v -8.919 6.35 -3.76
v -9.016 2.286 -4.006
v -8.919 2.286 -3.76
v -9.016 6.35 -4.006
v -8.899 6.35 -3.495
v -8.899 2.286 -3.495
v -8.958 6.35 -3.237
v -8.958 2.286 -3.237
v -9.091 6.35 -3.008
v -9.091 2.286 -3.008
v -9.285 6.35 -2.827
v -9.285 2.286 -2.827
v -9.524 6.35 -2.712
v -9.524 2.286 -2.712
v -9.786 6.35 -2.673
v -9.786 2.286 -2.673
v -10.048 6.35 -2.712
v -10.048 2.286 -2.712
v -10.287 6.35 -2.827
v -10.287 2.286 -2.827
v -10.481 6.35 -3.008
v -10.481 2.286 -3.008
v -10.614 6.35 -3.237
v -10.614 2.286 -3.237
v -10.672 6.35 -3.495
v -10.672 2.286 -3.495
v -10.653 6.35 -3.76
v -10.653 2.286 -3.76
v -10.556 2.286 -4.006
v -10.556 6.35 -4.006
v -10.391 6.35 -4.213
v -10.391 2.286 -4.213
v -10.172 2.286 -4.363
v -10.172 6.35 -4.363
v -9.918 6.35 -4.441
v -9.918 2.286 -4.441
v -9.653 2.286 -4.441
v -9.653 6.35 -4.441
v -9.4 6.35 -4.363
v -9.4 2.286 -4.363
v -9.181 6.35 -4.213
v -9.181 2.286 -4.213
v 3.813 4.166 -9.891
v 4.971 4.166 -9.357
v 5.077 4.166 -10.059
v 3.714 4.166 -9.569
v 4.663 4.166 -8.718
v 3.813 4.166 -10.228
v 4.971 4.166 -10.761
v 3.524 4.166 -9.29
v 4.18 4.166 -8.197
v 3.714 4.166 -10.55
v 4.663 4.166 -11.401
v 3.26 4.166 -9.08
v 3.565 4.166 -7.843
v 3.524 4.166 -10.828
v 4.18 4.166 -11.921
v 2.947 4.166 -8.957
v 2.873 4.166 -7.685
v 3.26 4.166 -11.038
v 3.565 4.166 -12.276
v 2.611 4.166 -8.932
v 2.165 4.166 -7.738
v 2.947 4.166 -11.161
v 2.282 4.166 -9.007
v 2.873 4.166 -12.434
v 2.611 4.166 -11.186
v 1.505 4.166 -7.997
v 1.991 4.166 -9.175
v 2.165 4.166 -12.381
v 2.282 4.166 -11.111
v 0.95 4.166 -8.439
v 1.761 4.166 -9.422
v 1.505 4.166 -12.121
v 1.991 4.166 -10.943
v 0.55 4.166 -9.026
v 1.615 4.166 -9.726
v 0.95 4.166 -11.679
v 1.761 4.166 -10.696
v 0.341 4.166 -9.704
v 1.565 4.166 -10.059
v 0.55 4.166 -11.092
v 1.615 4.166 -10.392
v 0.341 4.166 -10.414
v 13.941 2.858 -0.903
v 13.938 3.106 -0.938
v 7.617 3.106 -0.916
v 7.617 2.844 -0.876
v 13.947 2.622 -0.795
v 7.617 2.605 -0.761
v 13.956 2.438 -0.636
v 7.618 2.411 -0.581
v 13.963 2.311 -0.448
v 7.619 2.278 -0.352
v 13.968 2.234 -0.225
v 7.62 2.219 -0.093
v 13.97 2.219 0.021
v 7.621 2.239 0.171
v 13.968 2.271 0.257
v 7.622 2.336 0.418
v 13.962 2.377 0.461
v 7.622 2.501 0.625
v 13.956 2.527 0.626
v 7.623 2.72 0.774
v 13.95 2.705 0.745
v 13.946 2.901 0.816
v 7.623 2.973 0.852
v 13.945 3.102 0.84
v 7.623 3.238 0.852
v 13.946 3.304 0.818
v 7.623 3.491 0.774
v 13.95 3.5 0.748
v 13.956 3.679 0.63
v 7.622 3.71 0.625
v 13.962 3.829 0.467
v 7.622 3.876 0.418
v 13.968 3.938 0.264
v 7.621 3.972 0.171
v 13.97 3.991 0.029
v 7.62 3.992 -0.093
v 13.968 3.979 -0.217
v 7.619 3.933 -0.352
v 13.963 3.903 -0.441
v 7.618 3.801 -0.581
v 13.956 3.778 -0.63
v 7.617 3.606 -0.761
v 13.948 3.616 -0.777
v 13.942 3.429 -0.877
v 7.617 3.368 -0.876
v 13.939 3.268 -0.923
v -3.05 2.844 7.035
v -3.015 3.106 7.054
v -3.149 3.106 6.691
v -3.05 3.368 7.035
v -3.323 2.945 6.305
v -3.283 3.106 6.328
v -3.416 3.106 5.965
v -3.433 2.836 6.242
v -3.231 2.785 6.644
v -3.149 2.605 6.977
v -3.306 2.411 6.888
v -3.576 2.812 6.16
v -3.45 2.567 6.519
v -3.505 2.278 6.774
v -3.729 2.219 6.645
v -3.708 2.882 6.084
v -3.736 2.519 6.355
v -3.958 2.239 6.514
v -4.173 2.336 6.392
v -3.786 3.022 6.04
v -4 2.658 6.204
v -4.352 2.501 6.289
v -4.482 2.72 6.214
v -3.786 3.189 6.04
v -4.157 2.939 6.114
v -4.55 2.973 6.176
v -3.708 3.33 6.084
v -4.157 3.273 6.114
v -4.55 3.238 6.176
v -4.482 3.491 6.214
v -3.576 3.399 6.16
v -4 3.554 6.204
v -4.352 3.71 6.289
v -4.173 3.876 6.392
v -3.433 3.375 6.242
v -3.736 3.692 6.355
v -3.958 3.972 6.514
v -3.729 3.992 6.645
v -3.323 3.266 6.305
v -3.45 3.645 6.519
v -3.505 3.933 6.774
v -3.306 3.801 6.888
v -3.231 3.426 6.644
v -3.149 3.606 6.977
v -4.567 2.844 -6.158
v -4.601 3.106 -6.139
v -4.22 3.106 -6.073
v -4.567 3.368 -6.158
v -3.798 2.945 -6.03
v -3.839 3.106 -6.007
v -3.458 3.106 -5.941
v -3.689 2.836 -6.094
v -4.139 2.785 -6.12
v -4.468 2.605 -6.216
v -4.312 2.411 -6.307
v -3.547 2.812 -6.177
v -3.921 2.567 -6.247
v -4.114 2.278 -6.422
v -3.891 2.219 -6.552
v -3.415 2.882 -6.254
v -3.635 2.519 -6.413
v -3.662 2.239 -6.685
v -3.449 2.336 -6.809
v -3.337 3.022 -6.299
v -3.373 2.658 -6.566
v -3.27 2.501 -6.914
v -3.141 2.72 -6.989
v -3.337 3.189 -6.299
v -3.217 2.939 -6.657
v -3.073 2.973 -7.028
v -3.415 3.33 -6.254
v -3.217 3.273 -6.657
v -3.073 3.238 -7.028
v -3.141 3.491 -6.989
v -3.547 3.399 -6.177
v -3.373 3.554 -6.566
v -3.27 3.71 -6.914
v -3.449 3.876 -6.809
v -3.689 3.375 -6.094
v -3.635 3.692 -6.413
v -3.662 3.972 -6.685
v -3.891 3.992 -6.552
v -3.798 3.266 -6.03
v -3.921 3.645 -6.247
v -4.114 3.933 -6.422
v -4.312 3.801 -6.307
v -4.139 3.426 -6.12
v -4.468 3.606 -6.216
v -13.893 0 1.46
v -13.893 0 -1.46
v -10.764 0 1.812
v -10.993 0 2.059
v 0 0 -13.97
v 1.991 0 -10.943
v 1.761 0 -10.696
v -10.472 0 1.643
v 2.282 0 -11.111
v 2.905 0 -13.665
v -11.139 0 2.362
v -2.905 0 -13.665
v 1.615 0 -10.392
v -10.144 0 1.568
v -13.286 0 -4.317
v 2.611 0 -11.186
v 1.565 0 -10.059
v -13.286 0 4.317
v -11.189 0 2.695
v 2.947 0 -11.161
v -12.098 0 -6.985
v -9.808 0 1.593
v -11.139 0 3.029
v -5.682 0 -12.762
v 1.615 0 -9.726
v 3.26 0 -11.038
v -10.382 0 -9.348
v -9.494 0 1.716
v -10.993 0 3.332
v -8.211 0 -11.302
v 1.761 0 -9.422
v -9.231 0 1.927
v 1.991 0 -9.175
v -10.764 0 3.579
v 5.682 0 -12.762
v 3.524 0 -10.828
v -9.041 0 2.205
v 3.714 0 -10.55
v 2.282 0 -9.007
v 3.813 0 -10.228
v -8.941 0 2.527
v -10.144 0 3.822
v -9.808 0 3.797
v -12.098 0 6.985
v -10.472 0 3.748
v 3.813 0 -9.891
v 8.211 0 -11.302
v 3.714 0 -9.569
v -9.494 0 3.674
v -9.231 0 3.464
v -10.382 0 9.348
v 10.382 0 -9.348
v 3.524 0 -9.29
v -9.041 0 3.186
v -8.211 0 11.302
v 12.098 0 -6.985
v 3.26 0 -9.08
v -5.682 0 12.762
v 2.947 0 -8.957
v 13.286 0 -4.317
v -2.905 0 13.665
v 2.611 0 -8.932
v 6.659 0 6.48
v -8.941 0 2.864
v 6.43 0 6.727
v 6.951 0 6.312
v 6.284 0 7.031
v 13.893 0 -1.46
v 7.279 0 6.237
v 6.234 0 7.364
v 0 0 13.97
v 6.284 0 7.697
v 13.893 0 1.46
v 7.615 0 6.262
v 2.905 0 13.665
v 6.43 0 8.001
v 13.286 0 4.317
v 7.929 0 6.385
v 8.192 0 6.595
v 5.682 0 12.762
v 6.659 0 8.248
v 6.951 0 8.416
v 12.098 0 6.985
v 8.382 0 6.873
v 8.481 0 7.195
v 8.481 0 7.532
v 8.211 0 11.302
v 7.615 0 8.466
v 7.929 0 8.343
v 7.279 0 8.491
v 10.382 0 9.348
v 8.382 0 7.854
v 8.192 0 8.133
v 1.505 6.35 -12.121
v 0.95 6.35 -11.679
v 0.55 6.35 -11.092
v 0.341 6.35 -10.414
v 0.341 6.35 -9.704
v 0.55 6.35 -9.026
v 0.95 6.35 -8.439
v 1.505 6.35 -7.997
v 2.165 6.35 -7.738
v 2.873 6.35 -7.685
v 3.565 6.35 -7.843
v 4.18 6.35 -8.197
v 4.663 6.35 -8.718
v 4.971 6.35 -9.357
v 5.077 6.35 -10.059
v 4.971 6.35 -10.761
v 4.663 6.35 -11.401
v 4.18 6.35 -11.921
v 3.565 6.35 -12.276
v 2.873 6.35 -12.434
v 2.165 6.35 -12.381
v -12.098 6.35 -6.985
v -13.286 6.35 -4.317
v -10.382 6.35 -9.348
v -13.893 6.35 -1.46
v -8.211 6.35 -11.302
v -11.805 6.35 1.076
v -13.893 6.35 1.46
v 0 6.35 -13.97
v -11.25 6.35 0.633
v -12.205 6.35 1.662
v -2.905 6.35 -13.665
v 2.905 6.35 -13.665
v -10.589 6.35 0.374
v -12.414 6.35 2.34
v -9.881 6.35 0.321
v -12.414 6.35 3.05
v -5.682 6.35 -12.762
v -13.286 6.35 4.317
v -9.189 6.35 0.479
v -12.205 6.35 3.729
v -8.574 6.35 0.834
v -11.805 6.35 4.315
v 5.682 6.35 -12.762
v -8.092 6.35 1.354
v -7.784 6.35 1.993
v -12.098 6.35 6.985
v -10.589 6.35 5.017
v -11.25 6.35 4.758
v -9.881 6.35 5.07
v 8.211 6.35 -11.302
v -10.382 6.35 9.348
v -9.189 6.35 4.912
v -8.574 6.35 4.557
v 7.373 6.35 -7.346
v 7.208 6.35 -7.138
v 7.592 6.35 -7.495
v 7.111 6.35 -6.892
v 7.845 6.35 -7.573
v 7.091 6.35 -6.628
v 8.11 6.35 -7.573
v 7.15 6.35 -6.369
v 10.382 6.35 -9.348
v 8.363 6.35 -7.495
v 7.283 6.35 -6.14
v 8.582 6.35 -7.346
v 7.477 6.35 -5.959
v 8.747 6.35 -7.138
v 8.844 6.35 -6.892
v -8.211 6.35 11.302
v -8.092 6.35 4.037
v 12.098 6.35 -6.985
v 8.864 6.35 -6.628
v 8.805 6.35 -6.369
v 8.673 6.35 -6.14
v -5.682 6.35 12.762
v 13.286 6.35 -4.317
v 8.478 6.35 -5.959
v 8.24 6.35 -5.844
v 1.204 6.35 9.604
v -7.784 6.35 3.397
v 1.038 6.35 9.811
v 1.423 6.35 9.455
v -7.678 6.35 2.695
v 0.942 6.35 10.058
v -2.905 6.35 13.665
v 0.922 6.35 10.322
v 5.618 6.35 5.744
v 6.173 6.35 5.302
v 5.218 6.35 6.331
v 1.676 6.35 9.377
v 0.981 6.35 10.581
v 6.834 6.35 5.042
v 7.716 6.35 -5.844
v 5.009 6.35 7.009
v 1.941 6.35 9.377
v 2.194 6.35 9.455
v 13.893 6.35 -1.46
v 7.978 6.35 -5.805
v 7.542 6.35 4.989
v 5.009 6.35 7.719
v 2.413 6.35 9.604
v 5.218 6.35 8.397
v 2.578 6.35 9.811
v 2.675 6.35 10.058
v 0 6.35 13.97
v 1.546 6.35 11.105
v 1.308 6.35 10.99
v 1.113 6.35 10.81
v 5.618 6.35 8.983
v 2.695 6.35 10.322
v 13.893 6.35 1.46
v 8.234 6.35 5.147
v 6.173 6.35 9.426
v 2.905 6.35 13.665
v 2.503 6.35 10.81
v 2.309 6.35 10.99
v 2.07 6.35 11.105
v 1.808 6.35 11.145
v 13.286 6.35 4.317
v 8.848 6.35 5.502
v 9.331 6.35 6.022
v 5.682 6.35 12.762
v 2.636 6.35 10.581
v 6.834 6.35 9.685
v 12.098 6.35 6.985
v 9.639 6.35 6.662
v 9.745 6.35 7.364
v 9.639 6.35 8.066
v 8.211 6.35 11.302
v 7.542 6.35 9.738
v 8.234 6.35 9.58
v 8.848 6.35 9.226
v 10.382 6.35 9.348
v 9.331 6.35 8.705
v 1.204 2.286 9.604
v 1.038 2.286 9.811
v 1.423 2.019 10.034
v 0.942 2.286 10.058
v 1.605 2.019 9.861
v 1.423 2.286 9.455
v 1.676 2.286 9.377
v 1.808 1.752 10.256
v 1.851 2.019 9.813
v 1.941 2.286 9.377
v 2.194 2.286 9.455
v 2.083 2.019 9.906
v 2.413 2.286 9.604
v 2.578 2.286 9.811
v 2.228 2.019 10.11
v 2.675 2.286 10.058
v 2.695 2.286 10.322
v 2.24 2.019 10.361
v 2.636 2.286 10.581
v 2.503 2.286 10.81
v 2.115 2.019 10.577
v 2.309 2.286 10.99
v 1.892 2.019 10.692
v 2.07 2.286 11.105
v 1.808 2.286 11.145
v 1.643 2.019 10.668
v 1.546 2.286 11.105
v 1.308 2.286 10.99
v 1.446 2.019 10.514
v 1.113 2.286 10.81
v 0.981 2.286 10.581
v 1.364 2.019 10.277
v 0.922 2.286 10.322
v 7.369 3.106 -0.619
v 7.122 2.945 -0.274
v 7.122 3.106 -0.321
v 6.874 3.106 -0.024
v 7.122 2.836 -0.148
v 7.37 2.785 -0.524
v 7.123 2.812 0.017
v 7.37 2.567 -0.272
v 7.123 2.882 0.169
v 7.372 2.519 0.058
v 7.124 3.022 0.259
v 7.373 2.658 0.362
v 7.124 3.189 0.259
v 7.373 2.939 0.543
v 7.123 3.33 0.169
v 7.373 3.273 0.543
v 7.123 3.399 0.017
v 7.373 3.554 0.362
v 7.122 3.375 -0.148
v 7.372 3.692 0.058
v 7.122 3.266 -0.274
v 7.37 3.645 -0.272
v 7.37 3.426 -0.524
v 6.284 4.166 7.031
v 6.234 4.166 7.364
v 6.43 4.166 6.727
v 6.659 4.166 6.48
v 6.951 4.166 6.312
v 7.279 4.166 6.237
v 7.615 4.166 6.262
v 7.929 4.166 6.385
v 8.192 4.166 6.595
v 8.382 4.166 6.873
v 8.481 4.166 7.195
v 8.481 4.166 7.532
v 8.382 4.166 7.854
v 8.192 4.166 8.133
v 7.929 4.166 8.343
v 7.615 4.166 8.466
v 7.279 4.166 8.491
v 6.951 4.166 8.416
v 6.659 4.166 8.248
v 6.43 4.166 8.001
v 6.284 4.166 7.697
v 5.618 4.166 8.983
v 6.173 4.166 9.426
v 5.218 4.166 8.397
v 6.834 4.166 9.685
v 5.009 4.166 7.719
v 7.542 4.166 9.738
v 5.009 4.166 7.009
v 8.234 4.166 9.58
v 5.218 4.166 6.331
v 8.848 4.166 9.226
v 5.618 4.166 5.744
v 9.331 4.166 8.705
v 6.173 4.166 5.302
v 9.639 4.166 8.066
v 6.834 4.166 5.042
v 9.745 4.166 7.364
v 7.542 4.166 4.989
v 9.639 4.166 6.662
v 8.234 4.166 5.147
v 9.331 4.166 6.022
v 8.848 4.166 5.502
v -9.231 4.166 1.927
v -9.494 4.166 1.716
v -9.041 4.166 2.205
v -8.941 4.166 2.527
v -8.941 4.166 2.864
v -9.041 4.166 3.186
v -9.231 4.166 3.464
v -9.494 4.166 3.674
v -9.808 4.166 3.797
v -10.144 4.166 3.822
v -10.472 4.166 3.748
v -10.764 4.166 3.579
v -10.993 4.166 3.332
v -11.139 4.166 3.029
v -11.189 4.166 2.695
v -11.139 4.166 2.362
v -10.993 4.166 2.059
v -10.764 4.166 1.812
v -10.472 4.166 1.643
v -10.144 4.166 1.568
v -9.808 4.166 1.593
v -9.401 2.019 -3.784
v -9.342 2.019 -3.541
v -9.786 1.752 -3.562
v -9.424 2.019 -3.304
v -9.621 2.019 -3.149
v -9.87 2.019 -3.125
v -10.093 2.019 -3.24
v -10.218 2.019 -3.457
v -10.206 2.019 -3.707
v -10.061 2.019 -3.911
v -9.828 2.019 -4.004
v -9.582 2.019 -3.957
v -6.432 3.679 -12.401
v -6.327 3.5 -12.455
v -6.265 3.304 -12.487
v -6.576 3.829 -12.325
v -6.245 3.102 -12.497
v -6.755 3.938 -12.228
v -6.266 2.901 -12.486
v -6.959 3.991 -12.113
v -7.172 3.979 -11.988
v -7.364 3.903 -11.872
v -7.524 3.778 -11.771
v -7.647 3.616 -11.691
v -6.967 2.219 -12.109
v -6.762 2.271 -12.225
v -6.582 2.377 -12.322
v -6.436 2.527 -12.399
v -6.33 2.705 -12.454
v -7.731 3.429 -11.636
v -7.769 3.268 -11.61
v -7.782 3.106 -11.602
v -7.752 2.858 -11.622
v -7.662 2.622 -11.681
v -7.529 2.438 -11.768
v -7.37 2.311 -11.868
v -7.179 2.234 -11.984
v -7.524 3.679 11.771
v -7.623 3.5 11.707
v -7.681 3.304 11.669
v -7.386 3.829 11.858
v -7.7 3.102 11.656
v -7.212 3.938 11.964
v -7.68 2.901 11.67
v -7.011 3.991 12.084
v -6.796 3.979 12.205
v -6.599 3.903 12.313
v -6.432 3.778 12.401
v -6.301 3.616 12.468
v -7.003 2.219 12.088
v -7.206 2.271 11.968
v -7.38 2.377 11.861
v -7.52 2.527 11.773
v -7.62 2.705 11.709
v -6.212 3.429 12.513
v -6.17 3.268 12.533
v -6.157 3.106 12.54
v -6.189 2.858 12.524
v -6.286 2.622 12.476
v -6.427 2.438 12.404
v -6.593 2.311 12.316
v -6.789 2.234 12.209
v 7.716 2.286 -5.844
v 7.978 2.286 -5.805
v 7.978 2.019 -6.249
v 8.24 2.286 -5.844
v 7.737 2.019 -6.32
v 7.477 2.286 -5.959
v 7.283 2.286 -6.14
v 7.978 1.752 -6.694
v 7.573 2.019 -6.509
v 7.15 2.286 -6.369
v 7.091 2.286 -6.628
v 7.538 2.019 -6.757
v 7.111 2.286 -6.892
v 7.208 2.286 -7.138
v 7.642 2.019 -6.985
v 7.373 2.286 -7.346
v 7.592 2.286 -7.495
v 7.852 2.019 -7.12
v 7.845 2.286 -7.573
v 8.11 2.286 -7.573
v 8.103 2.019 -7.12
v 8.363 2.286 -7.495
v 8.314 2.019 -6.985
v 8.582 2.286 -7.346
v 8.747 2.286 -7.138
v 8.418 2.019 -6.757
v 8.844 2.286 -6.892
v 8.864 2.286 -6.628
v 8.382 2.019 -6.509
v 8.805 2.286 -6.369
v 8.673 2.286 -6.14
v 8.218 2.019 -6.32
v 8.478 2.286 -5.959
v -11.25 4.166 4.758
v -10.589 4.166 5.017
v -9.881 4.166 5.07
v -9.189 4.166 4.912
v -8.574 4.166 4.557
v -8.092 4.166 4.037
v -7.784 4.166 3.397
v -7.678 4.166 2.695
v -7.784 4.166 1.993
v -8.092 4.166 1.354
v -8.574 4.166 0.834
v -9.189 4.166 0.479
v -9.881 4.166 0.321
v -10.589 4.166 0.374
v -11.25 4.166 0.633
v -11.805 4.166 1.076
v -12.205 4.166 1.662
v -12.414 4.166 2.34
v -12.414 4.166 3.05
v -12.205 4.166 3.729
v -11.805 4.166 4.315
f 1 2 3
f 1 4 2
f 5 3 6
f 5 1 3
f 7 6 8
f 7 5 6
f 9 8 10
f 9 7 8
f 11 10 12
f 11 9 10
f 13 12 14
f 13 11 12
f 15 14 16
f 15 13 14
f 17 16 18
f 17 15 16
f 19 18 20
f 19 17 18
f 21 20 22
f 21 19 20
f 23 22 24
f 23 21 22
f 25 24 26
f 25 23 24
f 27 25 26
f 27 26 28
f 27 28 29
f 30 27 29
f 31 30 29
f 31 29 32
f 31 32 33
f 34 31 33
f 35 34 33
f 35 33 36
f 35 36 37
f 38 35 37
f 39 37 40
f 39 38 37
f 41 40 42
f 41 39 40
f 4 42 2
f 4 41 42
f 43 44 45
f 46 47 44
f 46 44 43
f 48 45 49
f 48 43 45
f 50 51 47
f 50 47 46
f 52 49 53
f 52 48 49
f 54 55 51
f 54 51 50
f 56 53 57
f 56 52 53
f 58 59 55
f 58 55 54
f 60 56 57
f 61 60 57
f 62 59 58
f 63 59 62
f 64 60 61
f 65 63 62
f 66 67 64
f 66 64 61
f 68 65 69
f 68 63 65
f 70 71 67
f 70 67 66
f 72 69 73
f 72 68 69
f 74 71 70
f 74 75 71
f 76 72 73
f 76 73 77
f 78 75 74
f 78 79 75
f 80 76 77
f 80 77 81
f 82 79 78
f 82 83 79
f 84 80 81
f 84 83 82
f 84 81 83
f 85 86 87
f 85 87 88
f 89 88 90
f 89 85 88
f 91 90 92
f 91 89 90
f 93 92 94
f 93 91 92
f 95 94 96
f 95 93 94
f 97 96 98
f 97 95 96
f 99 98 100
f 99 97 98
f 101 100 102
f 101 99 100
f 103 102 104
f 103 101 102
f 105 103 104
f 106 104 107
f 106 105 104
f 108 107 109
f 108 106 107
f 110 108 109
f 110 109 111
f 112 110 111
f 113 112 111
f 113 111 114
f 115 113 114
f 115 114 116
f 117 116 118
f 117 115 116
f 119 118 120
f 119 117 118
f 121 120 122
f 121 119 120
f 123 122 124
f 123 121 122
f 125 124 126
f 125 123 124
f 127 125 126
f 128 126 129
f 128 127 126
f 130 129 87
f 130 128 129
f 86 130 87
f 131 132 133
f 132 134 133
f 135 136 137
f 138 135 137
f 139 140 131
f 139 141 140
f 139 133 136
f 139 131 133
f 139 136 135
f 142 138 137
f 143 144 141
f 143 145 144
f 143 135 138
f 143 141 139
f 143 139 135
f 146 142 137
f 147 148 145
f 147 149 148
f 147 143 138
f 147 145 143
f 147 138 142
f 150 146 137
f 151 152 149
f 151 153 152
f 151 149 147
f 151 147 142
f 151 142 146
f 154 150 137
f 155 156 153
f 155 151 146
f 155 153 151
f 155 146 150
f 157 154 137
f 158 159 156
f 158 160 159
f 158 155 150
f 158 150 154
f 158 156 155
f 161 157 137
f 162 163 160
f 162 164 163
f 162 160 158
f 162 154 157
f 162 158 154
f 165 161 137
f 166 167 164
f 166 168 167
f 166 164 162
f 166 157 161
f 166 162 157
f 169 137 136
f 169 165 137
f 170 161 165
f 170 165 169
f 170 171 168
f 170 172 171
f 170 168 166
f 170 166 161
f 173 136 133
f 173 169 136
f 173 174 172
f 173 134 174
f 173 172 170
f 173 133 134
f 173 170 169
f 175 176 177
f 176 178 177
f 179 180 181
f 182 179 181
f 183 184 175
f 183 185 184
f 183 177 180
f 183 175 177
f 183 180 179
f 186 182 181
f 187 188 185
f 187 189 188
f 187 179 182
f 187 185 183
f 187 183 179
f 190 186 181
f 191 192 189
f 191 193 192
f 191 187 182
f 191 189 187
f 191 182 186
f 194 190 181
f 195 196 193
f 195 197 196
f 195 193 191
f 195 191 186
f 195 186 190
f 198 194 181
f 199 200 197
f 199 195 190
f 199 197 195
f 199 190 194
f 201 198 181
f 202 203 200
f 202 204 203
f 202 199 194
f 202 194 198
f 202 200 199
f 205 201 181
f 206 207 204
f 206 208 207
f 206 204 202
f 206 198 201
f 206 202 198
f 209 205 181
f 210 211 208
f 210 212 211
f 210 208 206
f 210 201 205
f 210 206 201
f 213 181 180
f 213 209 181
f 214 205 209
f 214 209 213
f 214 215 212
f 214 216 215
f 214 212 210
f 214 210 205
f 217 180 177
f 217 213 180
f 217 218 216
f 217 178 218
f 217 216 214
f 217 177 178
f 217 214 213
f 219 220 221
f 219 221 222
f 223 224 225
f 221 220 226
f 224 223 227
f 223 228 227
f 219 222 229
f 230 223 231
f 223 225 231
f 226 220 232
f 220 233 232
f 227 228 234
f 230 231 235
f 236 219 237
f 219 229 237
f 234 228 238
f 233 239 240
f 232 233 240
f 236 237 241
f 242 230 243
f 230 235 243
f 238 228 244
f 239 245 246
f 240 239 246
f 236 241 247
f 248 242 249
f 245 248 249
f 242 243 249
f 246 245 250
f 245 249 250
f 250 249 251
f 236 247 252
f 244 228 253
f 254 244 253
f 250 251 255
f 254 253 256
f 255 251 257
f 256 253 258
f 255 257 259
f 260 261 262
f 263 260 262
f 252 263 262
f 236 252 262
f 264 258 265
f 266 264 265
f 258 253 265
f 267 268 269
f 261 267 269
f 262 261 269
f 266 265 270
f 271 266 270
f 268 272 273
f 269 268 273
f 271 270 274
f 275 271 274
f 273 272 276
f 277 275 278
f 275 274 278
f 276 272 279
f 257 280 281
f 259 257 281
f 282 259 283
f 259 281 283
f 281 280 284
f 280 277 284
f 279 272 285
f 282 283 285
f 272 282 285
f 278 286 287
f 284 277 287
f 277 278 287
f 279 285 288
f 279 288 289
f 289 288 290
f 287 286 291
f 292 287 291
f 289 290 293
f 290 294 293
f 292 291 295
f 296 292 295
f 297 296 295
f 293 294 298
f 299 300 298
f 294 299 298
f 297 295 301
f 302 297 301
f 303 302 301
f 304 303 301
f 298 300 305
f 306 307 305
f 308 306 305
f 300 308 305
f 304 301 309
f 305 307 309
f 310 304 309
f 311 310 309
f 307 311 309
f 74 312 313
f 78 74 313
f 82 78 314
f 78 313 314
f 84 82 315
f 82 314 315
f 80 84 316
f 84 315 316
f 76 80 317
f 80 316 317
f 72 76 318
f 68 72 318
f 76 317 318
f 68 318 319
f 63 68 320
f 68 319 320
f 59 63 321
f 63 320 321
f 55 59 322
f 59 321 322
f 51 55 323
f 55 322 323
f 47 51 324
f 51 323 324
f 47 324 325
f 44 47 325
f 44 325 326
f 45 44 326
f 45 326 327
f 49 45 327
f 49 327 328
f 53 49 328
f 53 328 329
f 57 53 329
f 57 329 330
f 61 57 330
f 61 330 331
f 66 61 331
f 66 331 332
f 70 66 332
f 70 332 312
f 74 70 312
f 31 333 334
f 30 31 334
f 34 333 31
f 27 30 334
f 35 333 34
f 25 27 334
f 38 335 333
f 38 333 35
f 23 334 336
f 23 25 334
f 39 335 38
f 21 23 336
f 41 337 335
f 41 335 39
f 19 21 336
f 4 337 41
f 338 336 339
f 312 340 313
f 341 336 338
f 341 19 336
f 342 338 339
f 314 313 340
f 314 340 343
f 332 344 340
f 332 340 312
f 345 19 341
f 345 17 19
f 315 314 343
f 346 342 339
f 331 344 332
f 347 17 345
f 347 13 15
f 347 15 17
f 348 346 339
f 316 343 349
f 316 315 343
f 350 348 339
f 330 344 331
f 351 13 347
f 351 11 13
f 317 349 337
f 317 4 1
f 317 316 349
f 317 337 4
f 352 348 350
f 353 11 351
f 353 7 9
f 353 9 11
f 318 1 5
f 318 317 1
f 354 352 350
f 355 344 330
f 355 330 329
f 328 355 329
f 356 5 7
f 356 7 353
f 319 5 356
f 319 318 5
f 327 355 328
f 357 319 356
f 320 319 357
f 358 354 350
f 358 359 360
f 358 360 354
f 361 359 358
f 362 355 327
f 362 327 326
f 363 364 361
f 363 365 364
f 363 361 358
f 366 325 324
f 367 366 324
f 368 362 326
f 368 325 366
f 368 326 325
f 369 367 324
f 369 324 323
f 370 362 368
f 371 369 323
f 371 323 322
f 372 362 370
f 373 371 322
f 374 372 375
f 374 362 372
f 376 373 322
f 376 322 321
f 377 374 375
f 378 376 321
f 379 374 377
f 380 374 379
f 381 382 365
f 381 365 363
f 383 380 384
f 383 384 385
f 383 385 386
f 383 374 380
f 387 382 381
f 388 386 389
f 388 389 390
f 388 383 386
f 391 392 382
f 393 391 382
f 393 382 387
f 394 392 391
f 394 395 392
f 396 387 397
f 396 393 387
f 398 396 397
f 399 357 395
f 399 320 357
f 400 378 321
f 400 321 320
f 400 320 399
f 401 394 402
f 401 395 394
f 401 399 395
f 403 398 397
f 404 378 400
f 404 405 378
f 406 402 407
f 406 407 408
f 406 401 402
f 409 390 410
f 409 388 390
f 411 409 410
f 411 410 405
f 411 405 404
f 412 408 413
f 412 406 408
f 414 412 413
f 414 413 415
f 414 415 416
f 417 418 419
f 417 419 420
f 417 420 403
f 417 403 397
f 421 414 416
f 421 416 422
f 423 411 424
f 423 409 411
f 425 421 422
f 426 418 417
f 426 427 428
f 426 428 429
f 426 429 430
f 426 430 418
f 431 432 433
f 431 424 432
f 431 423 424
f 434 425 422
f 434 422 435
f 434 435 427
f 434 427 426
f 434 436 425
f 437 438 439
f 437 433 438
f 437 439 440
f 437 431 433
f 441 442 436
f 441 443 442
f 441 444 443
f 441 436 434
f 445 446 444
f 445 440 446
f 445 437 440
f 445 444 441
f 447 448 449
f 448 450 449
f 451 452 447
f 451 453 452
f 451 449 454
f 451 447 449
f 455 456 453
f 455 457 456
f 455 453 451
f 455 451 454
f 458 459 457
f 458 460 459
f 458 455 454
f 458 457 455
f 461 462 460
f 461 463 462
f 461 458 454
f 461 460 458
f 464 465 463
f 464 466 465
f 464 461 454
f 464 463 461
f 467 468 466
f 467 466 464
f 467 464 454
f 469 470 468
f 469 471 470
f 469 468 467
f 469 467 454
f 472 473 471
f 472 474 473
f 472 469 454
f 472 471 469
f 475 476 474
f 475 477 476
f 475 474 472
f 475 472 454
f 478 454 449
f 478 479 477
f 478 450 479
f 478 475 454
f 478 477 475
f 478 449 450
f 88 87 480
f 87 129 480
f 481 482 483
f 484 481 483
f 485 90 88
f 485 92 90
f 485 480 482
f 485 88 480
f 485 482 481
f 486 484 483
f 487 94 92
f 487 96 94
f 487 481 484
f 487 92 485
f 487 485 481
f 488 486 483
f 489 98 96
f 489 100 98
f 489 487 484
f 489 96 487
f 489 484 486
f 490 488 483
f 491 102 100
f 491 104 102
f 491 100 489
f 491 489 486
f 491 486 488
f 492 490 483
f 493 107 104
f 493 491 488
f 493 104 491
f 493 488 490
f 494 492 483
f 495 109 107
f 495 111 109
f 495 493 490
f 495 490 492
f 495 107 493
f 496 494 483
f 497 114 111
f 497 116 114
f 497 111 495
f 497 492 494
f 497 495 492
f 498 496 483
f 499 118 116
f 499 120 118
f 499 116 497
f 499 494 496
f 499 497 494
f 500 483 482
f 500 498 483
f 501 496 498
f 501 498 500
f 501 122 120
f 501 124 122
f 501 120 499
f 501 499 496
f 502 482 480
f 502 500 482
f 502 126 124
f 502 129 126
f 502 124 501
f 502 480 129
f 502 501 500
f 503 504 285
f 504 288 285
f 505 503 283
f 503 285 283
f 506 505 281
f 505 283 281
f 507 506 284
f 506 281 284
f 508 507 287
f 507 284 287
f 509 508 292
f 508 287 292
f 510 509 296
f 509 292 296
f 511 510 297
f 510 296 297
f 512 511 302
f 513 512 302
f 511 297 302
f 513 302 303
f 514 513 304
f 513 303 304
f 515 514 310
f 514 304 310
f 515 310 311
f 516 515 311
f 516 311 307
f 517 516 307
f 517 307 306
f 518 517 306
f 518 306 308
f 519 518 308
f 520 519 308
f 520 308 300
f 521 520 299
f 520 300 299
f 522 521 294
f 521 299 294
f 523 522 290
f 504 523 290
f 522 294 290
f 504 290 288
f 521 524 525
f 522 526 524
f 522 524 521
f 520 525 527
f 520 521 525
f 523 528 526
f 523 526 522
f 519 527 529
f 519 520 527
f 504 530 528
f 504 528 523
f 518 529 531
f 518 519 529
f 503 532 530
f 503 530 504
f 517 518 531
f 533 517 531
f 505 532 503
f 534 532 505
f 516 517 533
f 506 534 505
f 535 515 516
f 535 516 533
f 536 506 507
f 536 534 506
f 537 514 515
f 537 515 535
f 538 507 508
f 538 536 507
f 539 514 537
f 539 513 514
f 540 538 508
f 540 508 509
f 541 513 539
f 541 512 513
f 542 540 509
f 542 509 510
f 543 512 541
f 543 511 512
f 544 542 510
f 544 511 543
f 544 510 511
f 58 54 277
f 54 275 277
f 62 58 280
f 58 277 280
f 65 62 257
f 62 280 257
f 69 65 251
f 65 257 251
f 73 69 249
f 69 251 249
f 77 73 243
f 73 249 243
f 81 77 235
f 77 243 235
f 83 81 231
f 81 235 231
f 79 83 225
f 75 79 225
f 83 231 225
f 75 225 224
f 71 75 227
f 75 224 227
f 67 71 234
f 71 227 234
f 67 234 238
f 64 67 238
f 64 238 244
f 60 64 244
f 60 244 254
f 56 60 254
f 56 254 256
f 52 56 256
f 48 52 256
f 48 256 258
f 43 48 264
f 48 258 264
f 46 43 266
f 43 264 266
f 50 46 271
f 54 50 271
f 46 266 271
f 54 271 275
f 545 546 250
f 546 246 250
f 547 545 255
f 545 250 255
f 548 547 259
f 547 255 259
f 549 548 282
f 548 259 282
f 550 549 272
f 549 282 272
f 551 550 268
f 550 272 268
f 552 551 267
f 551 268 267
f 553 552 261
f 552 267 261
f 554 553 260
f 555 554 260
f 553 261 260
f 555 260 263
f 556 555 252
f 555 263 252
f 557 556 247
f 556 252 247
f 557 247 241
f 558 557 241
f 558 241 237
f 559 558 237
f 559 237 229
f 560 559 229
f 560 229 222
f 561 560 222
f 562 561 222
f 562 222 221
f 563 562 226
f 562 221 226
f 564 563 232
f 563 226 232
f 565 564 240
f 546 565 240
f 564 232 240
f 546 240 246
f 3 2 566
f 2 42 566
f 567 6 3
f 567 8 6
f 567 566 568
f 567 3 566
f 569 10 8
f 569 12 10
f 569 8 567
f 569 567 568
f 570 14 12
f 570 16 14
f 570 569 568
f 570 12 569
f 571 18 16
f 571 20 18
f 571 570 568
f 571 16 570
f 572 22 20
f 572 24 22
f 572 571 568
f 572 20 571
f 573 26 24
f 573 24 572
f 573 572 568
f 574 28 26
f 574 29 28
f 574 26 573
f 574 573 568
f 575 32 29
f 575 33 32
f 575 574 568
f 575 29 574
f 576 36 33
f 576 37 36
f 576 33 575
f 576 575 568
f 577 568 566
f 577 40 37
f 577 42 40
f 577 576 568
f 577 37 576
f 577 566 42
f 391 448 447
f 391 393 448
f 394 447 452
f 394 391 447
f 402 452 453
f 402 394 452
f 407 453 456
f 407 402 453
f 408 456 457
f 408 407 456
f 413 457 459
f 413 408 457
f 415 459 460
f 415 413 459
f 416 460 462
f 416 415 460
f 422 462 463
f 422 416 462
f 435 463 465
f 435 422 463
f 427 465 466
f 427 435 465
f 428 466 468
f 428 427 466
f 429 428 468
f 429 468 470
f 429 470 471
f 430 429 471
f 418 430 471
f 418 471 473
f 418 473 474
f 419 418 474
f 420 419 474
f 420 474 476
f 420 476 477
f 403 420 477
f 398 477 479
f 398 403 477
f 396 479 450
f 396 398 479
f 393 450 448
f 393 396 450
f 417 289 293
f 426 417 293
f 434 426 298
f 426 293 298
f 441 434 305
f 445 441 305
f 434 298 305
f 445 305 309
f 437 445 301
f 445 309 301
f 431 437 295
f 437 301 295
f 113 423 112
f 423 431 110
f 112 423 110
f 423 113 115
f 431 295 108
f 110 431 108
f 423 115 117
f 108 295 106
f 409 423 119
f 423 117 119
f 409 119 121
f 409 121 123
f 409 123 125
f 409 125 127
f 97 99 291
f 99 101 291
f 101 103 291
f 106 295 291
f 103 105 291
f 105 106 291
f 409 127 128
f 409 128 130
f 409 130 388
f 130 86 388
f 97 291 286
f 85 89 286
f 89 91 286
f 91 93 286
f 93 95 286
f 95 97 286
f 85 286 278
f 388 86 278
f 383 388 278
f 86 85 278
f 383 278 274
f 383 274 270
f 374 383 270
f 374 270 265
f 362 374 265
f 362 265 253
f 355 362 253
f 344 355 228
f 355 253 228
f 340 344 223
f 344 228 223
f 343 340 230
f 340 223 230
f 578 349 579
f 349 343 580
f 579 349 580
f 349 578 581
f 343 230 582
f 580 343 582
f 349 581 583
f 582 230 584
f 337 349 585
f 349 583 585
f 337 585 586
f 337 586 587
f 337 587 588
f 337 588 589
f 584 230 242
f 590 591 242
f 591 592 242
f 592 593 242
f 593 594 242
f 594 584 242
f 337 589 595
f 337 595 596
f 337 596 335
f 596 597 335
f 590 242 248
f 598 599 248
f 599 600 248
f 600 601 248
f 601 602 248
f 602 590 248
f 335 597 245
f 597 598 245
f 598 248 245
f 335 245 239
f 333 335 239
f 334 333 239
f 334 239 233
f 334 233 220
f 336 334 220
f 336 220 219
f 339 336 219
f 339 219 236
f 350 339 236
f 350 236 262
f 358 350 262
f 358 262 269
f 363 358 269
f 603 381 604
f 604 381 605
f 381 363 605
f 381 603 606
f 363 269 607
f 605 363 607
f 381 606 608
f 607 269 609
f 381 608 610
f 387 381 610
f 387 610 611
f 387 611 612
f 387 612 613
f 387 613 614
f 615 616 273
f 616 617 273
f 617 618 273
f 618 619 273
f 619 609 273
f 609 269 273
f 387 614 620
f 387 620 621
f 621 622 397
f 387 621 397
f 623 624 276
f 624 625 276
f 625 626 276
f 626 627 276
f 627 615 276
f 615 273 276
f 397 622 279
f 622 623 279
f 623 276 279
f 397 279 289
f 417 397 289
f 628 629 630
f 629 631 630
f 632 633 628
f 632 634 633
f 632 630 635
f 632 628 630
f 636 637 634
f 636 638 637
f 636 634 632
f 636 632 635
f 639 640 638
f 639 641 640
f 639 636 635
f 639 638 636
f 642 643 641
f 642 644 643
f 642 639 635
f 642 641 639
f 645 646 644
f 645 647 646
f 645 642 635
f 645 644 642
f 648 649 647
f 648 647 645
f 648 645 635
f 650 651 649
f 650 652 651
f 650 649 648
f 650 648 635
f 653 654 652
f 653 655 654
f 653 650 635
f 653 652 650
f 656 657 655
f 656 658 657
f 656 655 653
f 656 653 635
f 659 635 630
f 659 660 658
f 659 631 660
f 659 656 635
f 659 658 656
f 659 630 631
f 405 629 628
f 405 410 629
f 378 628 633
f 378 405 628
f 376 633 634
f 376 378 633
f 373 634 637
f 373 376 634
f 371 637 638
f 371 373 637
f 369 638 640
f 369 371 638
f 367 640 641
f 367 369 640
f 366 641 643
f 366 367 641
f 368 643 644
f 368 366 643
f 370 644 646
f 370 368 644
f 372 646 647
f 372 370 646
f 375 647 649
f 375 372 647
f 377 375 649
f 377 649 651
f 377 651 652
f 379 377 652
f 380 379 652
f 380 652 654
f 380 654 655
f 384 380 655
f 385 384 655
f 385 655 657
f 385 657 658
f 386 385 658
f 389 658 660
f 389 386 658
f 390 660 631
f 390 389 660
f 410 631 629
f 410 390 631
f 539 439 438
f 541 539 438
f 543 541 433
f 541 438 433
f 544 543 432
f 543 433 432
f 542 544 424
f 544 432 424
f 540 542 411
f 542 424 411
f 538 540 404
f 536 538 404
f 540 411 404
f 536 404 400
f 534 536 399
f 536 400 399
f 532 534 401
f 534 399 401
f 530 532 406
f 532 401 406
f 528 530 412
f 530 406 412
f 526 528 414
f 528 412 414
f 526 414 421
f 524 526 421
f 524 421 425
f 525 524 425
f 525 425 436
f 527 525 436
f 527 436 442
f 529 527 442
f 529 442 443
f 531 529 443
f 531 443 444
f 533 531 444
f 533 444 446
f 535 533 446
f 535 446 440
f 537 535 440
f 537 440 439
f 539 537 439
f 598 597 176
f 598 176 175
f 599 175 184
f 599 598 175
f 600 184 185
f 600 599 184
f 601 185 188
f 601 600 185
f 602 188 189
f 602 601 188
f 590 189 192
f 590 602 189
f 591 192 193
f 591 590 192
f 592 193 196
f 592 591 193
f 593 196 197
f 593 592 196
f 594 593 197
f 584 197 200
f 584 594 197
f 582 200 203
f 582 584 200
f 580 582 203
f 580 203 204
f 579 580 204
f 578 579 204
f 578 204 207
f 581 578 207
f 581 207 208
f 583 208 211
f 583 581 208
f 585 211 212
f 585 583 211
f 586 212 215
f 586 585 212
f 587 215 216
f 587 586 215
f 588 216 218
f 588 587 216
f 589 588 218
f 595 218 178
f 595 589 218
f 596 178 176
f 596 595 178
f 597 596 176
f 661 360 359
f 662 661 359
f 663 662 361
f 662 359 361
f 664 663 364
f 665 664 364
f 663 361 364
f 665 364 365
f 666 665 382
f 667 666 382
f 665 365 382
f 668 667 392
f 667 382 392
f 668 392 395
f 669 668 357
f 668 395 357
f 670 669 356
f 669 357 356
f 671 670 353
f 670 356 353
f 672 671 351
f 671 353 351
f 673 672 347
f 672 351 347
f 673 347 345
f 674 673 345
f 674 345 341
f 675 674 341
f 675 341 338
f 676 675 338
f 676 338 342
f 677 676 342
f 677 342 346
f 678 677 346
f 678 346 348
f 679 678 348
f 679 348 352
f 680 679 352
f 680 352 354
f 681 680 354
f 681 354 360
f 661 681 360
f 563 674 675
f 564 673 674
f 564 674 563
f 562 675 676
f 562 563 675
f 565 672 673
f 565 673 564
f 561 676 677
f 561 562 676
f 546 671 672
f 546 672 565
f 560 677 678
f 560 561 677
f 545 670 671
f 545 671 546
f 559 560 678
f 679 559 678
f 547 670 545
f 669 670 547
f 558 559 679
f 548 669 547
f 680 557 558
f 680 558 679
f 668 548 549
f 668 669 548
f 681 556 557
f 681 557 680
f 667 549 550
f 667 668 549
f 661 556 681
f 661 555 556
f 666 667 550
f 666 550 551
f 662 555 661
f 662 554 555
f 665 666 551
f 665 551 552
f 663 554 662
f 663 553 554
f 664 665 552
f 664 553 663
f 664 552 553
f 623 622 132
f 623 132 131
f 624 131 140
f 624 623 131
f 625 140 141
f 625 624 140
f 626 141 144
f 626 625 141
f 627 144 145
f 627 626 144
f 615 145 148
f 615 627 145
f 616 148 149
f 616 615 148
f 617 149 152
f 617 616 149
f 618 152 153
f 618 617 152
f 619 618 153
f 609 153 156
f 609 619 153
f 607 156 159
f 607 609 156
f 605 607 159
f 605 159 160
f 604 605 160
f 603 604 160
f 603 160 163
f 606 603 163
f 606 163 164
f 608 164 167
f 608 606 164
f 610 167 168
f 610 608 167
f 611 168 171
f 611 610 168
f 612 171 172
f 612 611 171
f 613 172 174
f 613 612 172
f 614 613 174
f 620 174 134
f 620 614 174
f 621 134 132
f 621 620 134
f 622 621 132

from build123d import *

# Parameters (mm, degrees)
SKETCH1_R                                      = 13.97
BOSS_EXTRUDE1_DEPTH                            = 6.35
CBORE_FOR_2_SOCKET_HEAD_CAP_SCREW1_D           = 2.2606
CBORE_FOR_2_SOCKET_HEAD_CAP_SCREW1_CBORE_D     = 4.7625
CBORE_FOR_2_SOCKET_HEAD_CAP_SCREW1_CBORE_DEPTH = 2.1844
CIRPATTERN1_COUNT                              = 3
CIRPATTERN2_COUNT                              = 3
CIRPATTERN3_COUNT                              = 3


with BuildPart() as part:
    # Sketch1 → Boss-Extrude1 (new body)
    with BuildSketch(Plane(origin=(0, 0, 0), x_dir=(1, 0, 0), z_dir=(0, 1, 0))):
        with Locations(Location((0, 0, 0), (0, 0, 270))):
            Circle(SKETCH1_R)
    extrude(amount=BOSS_EXTRUDE1_DEPTH)

    # CBORE for #2 Socket Head Cap Screw1 (through all)
    with Locations(Plane(origin=(0, 6.35, 0), x_dir=(1, 0, 0), z_dir=(0, 1, 0))):
        with Locations((7.363810019, -7.363810019)):
            cbore_for_2_socket_head_cap_screw1 = CounterBoreHole(CBORE_FOR_2_SOCKET_HEAD_CAP_SCREW1_D / 2, CBORE_FOR_2_SOCKET_HEAD_CAP_SCREW1_CBORE_D / 2, CBORE_FOR_2_SOCKET_HEAD_CAP_SCREW1_CBORE_DEPTH)

    # CirPattern1: CBORE for #2 Socket Head Cap Screw1 ×3 about axis
    cirpattern1_axis = Axis((0, 0, 0), (0, 1, 0))
    for i in range(1, CIRPATTERN1_COUNT):
        add(cbore_for_2_socket_head_cap_screw1.rotate(cirpattern1_axis, i * 360 / CIRPATTERN1_COUNT), mode=Mode.SUBTRACT)

    # Sketch10 → Tap Drill for #2-56 Tap2 (revolve, cut)
    with BuildSketch(Plane(origin=(7.977586831, 6.35, -6.693990167), x_dir=(0, 0, 1), z_dir=(1, 0, 0))):
        Polygon((0, 0), (0, 4.59816509), (0.889, 4.064), (0.889, 0), align=None)
    tap_drill_for_2_56_tap2 = revolve(axis=Axis((7.977586831, 12.7, -6.693990167), (0, -1, 0)), mode=Mode.SUBTRACT)

    # CirPattern2: Tap Drill for #2-56 Tap2 ×3 about axis
    cirpattern2_axis = Axis((0, 0, 0), (0, 1, 0))
    for i in range(1, CIRPATTERN2_COUNT):
        add(tap_drill_for_2_56_tap2.rotate(cirpattern2_axis, i * 360 / CIRPATTERN2_COUNT), mode=Mode.SUBTRACT)

    # Sketch15 → Tap Drill for #2-56 Tap1 (revolve, cut)
    with BuildSketch(Plane(origin=(-6.942501454, 3.105629072, 12.122812114), x_dir=(0.8677746681735182, 0, 0.4969578707258195), z_dir=(0, 1, 0))):
        Polygon((0, 0), (0, 7.095959572), (0.889, 6.35), (0.889, 0), align=None)
    tap_drill_for_2_56_tap1 = revolve(axis=Axis((-10.098183933, 3.105629072, 17.633181257), (0.4969578707258195, 0, -0.8677746681735182)), mode=Mode.SUBTRACT)

    # CirPattern3: Tap Drill for #2-56 Tap1 ×3 about axis
    cirpattern3_axis = Axis((0, 6.35, 0), (0, -1, 0))
    for i in range(1, CIRPATTERN3_COUNT):
        add(tap_drill_for_2_56_tap1.rotate(cirpattern3_axis, i * 360 / CIRPATTERN3_COUNT), mode=Mode.SUBTRACT)


solid = part.part
